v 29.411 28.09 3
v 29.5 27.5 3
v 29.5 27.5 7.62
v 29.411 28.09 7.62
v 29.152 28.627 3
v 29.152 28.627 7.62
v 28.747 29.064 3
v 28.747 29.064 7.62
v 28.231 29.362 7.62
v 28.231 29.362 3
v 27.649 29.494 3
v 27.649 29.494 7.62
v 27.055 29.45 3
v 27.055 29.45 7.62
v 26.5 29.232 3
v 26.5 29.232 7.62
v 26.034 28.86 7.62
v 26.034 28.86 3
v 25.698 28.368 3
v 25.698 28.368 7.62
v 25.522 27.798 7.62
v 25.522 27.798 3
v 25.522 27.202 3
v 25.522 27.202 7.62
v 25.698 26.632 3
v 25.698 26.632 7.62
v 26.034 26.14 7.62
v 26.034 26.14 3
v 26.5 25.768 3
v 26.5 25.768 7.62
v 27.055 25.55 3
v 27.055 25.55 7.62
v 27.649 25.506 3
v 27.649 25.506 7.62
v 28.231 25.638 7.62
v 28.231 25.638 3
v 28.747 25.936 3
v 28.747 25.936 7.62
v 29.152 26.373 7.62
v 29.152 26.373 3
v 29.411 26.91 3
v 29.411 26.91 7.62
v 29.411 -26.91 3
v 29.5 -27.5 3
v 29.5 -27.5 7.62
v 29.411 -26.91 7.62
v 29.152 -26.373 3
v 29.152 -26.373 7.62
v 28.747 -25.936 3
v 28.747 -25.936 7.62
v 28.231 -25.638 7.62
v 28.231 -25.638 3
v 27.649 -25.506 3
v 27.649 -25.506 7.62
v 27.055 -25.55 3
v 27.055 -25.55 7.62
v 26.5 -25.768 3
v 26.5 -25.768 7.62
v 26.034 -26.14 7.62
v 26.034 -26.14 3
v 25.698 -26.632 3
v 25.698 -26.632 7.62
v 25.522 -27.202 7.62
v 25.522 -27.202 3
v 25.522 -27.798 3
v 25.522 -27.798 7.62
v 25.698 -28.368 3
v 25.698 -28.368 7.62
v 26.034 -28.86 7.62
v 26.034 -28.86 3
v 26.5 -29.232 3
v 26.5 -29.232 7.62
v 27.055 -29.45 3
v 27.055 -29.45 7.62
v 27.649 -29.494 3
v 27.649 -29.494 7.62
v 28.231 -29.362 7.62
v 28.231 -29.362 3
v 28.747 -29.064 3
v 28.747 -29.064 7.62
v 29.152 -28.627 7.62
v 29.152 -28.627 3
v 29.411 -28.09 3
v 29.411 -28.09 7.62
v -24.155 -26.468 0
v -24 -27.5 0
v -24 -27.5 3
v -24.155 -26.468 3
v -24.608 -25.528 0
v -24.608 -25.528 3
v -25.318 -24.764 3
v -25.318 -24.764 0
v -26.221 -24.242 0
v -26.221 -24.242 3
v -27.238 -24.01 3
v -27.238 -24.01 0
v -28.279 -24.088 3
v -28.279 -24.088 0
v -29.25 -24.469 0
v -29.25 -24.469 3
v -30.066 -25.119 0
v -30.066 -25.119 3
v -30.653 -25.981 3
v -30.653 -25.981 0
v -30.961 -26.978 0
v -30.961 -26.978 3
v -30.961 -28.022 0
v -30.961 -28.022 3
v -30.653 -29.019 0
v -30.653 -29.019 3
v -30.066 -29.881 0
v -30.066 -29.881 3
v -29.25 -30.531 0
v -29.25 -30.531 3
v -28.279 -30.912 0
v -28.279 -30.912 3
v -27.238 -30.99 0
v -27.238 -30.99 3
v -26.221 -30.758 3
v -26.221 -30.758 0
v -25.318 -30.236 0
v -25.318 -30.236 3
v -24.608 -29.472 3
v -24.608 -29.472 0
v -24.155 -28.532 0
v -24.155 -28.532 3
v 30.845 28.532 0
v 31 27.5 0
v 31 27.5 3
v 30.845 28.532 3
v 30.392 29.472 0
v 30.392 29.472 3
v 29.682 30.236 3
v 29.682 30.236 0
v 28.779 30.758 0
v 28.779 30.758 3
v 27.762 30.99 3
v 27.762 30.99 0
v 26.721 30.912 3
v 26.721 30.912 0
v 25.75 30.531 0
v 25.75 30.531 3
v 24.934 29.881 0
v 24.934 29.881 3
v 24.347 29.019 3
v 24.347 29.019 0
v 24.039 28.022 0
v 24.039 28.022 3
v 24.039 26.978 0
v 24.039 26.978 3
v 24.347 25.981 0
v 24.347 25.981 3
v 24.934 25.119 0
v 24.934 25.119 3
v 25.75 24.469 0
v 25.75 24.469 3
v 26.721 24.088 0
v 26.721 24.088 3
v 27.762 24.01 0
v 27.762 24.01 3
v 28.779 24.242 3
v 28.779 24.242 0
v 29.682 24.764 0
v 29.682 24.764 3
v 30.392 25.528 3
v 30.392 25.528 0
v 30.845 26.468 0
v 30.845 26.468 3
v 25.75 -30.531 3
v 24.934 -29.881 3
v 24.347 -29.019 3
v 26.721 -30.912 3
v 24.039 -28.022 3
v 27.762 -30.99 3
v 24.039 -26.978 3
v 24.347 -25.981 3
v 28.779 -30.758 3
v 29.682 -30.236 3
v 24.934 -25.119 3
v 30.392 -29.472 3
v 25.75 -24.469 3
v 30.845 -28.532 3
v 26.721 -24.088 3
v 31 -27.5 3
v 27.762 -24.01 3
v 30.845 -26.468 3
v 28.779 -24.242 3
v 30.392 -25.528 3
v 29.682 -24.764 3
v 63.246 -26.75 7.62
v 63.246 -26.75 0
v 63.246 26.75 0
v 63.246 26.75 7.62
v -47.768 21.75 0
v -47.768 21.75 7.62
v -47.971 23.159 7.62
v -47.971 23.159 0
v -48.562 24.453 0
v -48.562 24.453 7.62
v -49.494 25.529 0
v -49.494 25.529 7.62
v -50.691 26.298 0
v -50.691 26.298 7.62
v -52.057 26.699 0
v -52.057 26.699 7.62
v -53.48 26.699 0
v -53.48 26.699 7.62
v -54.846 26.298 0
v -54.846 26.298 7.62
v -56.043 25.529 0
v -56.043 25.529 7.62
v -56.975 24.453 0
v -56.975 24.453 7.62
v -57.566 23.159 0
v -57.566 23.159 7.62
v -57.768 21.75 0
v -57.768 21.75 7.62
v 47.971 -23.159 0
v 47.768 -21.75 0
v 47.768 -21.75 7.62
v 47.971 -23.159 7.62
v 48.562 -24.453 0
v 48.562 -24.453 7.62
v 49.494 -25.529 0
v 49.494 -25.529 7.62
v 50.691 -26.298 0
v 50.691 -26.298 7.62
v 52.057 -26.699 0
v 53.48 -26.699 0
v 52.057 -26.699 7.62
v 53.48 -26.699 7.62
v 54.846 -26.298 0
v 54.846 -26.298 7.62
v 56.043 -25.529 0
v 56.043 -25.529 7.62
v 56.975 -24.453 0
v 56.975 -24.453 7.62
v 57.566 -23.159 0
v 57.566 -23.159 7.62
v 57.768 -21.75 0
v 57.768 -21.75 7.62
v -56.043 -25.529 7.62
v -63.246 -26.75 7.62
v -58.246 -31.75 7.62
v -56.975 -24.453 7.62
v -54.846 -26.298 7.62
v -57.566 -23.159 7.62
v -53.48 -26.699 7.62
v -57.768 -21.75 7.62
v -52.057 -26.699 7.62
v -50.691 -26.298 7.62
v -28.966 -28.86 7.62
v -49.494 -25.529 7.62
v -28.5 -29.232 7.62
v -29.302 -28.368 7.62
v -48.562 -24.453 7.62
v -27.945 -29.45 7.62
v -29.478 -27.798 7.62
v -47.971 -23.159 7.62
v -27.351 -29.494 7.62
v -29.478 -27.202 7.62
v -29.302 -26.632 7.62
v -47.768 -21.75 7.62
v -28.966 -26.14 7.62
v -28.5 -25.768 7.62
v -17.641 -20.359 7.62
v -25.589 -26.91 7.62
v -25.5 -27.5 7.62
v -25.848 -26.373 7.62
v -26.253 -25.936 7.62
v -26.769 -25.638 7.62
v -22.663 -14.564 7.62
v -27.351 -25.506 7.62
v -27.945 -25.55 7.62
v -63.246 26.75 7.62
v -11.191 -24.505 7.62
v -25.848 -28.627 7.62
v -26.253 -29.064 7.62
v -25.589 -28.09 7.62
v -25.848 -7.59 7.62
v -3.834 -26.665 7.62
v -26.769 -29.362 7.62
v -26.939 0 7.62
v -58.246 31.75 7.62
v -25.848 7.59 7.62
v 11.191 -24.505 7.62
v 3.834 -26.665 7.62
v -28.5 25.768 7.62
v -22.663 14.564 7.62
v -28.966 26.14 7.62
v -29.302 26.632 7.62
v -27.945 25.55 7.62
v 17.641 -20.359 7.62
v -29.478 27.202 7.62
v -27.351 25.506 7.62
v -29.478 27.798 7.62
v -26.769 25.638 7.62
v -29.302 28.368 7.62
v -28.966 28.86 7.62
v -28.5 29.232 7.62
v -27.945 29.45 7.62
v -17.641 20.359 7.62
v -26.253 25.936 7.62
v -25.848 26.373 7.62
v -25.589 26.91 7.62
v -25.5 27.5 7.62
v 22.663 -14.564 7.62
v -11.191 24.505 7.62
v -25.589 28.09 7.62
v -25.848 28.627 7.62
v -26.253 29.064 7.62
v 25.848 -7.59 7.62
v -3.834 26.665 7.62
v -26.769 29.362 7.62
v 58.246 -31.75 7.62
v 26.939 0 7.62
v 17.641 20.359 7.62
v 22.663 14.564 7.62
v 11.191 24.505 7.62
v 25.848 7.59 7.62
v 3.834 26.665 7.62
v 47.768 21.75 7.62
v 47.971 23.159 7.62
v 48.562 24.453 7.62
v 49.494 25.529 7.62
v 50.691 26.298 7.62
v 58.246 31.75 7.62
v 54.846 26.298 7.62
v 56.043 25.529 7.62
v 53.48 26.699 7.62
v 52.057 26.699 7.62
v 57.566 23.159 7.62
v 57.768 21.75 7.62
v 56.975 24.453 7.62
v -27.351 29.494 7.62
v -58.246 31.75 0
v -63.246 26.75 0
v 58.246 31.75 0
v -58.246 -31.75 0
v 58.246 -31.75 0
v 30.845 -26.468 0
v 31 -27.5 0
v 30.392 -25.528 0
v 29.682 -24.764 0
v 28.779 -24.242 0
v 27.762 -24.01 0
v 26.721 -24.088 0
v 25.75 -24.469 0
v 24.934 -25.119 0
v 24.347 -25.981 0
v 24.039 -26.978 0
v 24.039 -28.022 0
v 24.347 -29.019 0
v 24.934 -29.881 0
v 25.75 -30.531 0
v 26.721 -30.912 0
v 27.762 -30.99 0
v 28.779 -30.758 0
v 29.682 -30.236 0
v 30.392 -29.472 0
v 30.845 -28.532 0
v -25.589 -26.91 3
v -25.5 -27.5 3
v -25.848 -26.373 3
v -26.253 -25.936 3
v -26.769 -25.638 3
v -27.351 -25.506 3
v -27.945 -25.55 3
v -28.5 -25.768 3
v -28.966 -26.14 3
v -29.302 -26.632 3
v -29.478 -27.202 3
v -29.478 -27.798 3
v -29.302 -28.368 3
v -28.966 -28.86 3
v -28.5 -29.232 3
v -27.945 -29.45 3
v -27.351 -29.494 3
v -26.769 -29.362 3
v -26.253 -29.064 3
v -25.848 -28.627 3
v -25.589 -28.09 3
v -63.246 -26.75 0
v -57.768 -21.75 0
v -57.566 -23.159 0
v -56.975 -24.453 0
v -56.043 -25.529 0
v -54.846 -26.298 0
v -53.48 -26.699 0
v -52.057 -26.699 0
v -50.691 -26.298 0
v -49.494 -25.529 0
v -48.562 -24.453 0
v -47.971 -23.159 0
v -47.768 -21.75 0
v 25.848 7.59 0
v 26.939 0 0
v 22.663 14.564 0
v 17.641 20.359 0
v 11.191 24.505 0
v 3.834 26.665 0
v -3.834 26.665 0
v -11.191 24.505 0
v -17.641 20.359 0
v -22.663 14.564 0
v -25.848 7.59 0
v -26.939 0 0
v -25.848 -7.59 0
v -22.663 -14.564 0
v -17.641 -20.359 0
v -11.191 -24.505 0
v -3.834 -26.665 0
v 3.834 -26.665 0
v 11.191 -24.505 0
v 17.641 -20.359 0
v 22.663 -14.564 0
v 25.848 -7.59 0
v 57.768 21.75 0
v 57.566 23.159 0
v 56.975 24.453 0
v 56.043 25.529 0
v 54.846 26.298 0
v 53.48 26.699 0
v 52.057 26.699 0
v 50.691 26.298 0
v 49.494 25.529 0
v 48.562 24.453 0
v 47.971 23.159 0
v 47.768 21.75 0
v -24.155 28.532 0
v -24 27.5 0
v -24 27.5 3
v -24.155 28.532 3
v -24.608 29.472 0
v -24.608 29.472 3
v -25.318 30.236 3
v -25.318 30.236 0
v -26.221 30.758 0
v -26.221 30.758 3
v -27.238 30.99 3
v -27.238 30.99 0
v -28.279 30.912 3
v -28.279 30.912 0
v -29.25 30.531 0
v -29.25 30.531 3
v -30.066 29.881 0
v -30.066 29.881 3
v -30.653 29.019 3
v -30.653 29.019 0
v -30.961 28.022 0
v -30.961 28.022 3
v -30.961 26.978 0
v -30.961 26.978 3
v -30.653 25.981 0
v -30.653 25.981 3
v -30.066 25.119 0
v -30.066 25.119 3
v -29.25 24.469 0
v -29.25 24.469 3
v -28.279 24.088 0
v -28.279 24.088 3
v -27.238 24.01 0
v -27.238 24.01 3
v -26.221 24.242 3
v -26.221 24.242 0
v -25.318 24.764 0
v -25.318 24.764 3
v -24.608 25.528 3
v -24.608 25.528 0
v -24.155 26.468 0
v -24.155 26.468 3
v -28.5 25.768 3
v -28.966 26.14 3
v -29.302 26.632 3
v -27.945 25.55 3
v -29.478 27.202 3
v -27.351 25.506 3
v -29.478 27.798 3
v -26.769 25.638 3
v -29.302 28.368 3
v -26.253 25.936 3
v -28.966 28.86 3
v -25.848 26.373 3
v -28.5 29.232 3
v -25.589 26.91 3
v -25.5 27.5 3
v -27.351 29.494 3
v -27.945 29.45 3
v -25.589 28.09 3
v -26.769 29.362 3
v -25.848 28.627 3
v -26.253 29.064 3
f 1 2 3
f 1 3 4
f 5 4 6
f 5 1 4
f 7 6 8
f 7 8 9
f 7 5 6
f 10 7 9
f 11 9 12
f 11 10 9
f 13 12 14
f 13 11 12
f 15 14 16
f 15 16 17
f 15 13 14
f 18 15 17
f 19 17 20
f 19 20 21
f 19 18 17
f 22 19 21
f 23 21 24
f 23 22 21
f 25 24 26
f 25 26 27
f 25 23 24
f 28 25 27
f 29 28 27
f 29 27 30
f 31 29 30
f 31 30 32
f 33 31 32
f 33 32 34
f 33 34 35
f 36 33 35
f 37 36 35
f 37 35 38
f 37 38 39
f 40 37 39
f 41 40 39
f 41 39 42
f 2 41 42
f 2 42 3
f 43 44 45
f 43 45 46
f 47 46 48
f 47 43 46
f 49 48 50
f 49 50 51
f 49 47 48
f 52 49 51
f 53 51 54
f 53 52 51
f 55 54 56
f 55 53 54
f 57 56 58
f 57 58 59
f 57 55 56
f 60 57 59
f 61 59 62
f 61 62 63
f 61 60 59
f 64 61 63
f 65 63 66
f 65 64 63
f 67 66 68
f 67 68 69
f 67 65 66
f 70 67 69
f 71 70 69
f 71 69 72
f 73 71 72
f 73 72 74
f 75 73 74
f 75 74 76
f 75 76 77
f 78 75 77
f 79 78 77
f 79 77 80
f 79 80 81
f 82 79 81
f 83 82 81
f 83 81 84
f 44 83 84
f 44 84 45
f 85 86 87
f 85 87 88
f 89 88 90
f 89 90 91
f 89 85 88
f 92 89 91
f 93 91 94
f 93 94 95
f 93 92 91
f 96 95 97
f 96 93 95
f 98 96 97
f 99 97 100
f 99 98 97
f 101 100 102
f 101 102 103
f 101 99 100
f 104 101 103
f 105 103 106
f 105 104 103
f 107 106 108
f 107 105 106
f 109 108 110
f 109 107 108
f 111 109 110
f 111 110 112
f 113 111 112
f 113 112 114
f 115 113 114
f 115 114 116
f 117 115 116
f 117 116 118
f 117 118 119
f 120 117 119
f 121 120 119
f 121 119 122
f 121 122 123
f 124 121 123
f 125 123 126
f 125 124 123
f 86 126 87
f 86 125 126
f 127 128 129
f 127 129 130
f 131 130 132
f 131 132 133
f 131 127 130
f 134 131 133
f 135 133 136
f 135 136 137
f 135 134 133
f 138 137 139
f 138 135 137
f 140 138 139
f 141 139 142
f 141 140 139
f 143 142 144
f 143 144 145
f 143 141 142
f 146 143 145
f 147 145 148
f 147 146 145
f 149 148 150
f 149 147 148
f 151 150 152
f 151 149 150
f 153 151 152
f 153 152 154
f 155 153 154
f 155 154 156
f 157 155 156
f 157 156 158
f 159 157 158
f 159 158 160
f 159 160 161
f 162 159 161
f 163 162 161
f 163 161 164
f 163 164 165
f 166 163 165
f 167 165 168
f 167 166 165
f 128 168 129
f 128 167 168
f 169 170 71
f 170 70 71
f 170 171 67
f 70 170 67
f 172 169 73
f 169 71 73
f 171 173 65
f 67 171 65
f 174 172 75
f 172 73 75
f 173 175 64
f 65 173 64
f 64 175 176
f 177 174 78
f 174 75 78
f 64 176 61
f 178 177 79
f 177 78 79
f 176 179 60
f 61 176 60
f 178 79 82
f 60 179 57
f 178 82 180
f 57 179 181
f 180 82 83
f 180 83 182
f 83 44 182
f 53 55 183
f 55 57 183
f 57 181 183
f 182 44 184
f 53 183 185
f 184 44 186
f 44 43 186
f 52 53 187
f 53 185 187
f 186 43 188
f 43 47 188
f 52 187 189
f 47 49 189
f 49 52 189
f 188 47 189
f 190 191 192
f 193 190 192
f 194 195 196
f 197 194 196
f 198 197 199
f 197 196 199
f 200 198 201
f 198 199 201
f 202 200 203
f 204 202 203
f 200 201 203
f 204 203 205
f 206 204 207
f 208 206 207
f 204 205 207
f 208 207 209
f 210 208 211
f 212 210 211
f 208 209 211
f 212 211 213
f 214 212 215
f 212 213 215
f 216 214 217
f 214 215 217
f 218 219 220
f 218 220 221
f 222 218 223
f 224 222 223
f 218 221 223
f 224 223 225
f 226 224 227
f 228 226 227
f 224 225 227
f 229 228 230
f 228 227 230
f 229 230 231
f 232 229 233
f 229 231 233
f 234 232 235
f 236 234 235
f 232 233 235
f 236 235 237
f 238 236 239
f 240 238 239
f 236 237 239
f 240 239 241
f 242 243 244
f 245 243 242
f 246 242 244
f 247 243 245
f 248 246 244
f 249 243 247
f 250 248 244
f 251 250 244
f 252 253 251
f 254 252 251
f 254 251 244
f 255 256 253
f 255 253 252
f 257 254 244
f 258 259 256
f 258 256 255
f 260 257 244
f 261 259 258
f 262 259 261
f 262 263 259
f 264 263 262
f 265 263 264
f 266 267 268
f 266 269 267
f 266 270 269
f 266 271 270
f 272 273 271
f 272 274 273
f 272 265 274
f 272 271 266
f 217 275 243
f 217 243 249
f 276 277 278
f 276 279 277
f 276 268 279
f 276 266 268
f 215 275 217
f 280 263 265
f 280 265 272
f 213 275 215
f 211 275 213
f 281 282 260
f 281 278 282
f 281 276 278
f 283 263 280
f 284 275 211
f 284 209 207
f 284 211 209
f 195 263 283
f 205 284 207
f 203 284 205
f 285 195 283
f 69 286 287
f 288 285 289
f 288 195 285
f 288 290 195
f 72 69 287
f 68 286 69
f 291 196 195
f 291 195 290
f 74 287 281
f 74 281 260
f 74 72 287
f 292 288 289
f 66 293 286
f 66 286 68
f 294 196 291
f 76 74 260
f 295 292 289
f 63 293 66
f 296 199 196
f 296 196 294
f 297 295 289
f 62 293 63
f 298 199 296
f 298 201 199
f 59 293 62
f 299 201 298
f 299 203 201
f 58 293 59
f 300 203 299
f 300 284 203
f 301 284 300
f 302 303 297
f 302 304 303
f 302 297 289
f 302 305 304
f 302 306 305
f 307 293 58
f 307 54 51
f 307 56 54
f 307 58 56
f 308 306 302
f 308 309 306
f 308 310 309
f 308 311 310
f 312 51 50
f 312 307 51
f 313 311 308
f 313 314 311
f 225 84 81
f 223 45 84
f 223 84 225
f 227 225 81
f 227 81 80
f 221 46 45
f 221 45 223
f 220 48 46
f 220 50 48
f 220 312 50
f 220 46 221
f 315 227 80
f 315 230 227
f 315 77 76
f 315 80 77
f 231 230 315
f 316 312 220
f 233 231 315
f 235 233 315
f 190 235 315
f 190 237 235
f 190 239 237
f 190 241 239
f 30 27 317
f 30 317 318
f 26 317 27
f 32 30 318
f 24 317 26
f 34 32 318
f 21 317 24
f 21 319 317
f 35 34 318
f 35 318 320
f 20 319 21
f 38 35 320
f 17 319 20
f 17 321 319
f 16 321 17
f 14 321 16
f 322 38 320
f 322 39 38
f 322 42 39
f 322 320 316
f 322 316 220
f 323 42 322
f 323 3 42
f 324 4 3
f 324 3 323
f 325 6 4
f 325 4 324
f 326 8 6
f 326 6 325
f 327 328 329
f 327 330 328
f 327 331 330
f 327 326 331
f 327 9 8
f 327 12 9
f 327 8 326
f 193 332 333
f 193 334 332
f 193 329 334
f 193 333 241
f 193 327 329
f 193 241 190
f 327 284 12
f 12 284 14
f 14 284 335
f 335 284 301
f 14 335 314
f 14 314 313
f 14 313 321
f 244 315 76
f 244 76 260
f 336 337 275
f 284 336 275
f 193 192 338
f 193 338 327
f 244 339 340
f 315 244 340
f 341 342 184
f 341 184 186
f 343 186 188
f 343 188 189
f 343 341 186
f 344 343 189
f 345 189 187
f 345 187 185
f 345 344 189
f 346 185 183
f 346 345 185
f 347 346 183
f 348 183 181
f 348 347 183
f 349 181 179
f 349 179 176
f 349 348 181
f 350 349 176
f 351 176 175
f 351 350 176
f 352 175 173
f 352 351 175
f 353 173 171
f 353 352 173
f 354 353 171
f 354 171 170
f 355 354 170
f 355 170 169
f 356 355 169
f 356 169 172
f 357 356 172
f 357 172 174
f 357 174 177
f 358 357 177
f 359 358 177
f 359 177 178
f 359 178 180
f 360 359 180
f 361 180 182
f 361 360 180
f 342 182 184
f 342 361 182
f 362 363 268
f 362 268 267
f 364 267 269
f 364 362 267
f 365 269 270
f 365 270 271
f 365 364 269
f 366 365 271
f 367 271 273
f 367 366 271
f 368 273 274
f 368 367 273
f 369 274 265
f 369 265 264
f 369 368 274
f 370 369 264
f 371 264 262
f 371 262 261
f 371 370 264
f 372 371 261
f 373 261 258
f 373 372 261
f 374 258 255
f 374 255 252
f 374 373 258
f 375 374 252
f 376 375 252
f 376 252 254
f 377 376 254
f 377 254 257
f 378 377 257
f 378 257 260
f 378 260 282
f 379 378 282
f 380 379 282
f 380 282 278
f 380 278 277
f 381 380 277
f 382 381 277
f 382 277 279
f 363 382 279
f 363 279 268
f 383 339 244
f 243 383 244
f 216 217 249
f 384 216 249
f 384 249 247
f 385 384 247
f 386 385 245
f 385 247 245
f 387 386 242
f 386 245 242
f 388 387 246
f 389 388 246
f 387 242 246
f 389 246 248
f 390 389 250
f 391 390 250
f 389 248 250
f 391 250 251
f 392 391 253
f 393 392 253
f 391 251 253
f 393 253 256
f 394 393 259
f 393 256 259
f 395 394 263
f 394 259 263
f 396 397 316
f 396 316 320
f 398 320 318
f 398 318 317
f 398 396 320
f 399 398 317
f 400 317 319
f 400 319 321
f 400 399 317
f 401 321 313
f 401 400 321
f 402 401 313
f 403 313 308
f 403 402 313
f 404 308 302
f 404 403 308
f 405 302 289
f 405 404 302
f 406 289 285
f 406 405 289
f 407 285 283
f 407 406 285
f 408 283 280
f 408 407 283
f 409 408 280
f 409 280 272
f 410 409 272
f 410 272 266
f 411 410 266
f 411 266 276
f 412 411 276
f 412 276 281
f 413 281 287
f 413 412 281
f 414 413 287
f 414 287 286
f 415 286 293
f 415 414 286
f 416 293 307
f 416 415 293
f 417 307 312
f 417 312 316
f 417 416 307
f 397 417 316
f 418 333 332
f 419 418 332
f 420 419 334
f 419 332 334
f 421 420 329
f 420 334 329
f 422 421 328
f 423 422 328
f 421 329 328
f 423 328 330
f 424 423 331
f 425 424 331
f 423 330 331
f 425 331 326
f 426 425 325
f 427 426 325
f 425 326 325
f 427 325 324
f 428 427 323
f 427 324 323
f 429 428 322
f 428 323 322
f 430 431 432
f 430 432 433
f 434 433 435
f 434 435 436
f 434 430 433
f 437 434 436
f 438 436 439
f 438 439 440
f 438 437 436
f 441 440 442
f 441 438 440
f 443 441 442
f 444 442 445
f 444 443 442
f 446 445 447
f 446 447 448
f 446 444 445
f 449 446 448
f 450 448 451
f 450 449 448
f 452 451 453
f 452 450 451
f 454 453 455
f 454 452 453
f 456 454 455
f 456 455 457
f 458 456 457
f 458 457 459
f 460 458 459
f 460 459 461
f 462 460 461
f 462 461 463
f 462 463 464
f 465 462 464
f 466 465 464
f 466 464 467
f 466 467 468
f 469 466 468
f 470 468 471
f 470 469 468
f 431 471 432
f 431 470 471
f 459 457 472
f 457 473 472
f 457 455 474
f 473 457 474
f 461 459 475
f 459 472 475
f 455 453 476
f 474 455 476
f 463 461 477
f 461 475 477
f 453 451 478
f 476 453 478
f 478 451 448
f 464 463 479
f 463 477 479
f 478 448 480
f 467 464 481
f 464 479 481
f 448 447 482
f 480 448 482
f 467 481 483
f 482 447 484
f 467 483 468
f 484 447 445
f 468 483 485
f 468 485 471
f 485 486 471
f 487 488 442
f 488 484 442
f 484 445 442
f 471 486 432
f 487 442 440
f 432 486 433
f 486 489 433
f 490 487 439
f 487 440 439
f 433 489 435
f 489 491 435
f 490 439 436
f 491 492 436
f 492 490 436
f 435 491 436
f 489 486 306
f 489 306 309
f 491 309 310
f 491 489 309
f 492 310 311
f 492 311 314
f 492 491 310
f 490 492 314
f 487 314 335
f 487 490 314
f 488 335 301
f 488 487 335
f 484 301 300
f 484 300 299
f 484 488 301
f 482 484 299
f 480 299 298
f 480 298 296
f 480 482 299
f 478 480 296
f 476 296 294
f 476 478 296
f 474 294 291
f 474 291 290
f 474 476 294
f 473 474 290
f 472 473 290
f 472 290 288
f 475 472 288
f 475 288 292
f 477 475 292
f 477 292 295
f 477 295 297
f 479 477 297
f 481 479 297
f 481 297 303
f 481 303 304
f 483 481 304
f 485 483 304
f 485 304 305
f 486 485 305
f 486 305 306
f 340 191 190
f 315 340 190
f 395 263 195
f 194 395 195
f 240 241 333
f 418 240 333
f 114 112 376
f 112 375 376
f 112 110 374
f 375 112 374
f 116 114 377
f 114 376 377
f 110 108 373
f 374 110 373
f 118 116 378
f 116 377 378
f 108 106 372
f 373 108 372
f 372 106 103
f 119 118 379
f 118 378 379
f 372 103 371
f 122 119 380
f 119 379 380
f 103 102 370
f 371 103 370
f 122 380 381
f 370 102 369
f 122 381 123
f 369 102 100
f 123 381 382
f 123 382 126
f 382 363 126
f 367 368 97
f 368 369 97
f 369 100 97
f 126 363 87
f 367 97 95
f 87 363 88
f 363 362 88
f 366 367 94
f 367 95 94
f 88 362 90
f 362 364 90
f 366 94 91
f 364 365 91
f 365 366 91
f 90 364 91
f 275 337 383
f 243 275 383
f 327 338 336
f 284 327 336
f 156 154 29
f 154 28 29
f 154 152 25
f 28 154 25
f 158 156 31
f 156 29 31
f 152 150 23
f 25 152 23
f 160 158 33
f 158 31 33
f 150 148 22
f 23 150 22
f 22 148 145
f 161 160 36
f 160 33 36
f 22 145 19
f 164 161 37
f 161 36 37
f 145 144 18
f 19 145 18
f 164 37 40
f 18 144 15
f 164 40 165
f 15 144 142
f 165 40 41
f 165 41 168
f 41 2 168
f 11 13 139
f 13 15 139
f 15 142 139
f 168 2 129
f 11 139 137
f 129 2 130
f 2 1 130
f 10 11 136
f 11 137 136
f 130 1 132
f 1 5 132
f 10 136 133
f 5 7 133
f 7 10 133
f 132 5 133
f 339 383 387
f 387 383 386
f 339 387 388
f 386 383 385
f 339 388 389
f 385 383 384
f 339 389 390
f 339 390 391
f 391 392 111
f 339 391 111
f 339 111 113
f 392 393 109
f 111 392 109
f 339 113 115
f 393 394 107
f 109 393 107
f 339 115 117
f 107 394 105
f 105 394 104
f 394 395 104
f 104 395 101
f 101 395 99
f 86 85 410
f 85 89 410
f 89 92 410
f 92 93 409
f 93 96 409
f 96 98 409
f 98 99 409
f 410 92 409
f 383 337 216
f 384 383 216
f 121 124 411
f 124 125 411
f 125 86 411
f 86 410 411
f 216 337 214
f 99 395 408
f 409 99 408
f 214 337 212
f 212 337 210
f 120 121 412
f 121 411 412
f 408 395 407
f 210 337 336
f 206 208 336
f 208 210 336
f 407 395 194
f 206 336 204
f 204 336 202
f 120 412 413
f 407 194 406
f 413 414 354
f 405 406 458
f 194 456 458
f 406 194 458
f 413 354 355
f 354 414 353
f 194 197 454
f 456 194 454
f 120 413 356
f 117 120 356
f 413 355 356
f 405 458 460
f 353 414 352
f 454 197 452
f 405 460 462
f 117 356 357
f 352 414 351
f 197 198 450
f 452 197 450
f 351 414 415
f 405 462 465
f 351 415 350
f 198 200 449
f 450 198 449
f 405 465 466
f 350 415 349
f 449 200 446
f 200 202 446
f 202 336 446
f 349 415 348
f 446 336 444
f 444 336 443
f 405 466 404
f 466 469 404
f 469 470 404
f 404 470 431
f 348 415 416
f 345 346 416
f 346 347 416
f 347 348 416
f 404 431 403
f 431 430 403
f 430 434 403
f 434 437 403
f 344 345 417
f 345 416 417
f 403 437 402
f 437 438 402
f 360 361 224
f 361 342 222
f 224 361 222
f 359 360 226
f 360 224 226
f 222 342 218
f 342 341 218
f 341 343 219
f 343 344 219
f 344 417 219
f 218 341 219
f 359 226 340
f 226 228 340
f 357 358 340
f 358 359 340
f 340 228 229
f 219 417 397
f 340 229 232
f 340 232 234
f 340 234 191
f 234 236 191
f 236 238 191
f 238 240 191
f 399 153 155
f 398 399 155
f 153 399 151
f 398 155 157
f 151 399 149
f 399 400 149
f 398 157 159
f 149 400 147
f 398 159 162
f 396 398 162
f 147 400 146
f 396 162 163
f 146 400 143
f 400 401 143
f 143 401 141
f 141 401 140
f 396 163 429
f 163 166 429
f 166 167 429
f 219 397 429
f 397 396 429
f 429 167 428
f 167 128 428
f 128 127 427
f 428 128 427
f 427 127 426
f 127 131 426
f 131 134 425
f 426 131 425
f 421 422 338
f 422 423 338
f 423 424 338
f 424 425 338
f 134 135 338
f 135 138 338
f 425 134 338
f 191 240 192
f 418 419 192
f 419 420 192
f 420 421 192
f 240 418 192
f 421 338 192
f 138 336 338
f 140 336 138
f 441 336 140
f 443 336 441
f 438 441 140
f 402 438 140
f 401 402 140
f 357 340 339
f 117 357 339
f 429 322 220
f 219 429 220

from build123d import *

# Parameters (mm, degrees)
F0_R     = 3.5
F0_R_2   = 26.939
F0_R_3   = 2
F1_DEPTH = 7.62
F2_SIZE  = 5
F3_DEPTH = 3
F5_DEPTH = 7.621


with BuildPart() as f1:
    # F0 (on Top) → F1 (new body)
    with BuildSketch(Plane.XY):
        with BuildLine():
            Line((-63.246, -31.75), (53.4919352041, -31.75))
            ThreePointArc((53.4919352041, -31.75), (54.587432302, -27.425845124), (55.5221311631, -23.0641060991))
            ThreePointArc((55.5221311631, -23.0641060991), (57.1917396179, -11.5857281785), (57.75, 0))
            ThreePointArc((57.75, 0), (57.2729939153, 10.71125257), (55.8457521723, 21.3377029383))
            ThreePointArc((55.8457521723, 21.3377029383), (54.7842028331, 26.5699297025), (53.4919352041, 31.75))
            Line((53.4919352041, 31.75), (-63.246, 31.75))
            Line((-63.246, 31.75), (-63.246, 4.9753375765))
            ThreePointArc((-63.246, 4.9753375765), (-59.3944076529, 3.7067505986), (-57.75, 0))
            ThreePointArc((-57.75, 0), (-59.3944076529, -3.7067505986), (-63.246, -4.9753375765))
            Line((-63.246, -4.9753375765), (-63.246, -31.75))
        make_face()
        with Locations((-27.5, -27.5)):
            Circle(F0_R, mode=Mode.SUBTRACT)
        with Locations((27.5, -27.5)):
            Circle(F0_R, mode=Mode.SUBTRACT)
        Circle(F0_R_2, mode=Mode.SUBTRACT)
        with Locations((-27.5, 27.5)):
            Circle(F0_R, mode=Mode.SUBTRACT)
        with Locations((27.5, 27.5)):
            Circle(F0_R, mode=Mode.SUBTRACT)
        with BuildLine():
            ThreePointArc((57.75, 0), (57.1917396179, -11.5857281785), (55.5221311631, -23.0641060991))
            ThreePointArc((55.5221311631, -23.0641060991), (57.5950674928, -19.9022732128), (61.2887553012, -19.0954754674))
            ThreePointArc((61.2887553012, -19.0954754674), (62.1685752816, -12.0664638405), (62.6503984064, -4.9990078538))
            ThreePointArc((62.6503984064, -4.9990078538), (59.1794252586, -3.5001422851), (57.75, 0))
        make_face()
        with BuildLine():
            ThreePointArc((61.5539163411, 17.285438446), (57.8723808444, 18.1459903288), (55.8457521723, 21.3377029383))
            ThreePointArc((55.8457521723, 21.3377029383), (57.2729939153, 10.71125257), (57.75, 0))
            ThreePointArc((57.75, 0), (59.1794252586, 3.5001422851), (62.6503984064, 4.9990078538))
            ThreePointArc((62.6503984064, 4.9990078538), (62.2532011392, 11.1557027996), (61.5539163411, 17.285438446))
        make_face()
        with BuildLine():
            Line((-63.246, 4.9753375765), (-63.246, -4.9753375765))
            ThreePointArc((-63.246, -4.9753375765), (-59.3944076529, -3.7067505986), (-57.75, 0))
            ThreePointArc((-57.75, 0), (-59.3944076529, 3.7067505986), (-63.246, 4.9753375765))
        make_face()
        with BuildLine():
            ThreePointArc((61.5539163411, 17.285438446), (60.7667377697, 22.2230846359), (59.7835039964, 27.1254566482))
            ThreePointArc((59.7835039964, 27.1254566482), (56.6327959648, 25.0356502181), (55.8457521723, 21.3377029383))
            ThreePointArc((55.8457521723, 21.3377029383), (57.8723808444, 18.1459903288), (61.5539163411, 17.285438446))
        make_face()
        with BuildLine():
            ThreePointArc((62.6503984064, 4.9990078538), (59.1794252586, 3.5001422851), (57.75, 0))
            ThreePointArc((57.75, 0), (59.1794252586, -3.5001422851), (62.6503984064, -4.9990078538))
            ThreePointArc((62.6503984064, -4.9990078538), (62.7250971309, -2.5), (62.75, 0))
            ThreePointArc((62.75, 0), (62.7250971309, 2.5), (62.6503984064, 4.9990078538))
        make_face()
        with BuildLine():
            ThreePointArc((55.5221311631, -23.0641060991), (56.2551893582, -26.7731327404), (59.375101392, -28.9086424794))
            ThreePointArc((59.375101392, -28.9086424794), (60.4296884523, -24.0211230541), (61.2887553012, -19.0954754674))
            ThreePointArc((61.2887553012, -19.0954754674), (57.5950674928, -19.9022732128), (55.5221311631, -23.0641060991))
        make_face()
        with Locations((-27.5, -27.5)):
            Circle(F0_R)
        with Locations((-27.5, -27.5)):
            Circle(F0_R_3, mode=Mode.SUBTRACT)
        with Locations((-27.5, 27.5)):
            Circle(F0_R)
        with Locations((-27.5, 27.5)):
            Circle(F0_R_3, mode=Mode.SUBTRACT)
        with Locations((27.5, 27.5)):
            Circle(F0_R)
        with Locations((27.5, 27.5)):
            Circle(F0_R_3, mode=Mode.SUBTRACT)
        with Locations((27.5, -27.5)):
            Circle(F0_R)
        with Locations((27.5, -27.5)):
            Circle(F0_R_3, mode=Mode.SUBTRACT)
        with BuildLine():
            ThreePointArc((59.7835039964, 27.1254566482), (59.2473718355, 29.4430172575), (58.6674102013, 31.75))
            Line((58.6674102013, 31.75), (53.4919352041, 31.75))
            ThreePointArc((53.4919352041, 31.75), (54.7842028331, 26.5699297025), (55.8457521723, 21.3377029383))
            ThreePointArc((55.8457521723, 21.3377029383), (56.6327959648, 25.0356502181), (59.7835039964, 27.1254566482))
        make_face()
        with BuildLine():
            ThreePointArc((59.375101392, -28.9086424794), (61.3882555849, -28.928377791), (63.246, -28.1525137724))
            Line((63.246, -28.1525137724), (63.246, -19.8897323359))
            ThreePointArc((63.246, -19.8897323359), (62.3097981786, -19.3880692646), (61.2887553012, -19.0954754674))
            ThreePointArc((61.2887553012, -19.0954754674), (60.4296884523, -24.0211230541), (59.375101392, -28.9086424794))
        make_face()
        with BuildLine():
            ThreePointArc((63.246, 26.5651185825), (61.5654992942, 27.1588702904), (59.7835039964, 27.1254566482))
            ThreePointArc((59.7835039964, 27.1254566482), (60.7667377697, 22.2230846359), (61.5539163411, 17.285438446))
            ThreePointArc((61.5539163411, 17.285438446), (62.4268875713, 17.5067404334), (63.246, 17.8810506893))
            Line((63.246, 17.8810506893), (63.246, 26.5651185825))
        make_face()
        with BuildLine():
            Line((53.4919352041, -31.75), (58.6674102013, -31.75))
            ThreePointArc((58.6674102013, -31.75), (59.0295428897, -30.3313852893), (59.375101392, -28.9086424794))
            ThreePointArc((59.375101392, -28.9086424794), (56.2551893582, -26.7731327404), (55.5221311631, -23.0641060991))
            ThreePointArc((55.5221311631, -23.0641060991), (54.587432302, -27.425845124), (53.4919352041, -31.75))
        make_face()
        with BuildLine():
            Line((63.246, 31.75), (58.6674102013, 31.75))
            ThreePointArc((58.6674102013, 31.75), (59.2473718355, 29.4430172575), (59.7835039964, 27.1254566482))
            ThreePointArc((59.7835039964, 27.1254566482), (61.5654992942, 27.1588702904), (63.246, 26.5651185825))
            Line((63.246, 26.5651185825), (63.246, 31.75))
        make_face()
        with BuildLine():
            ThreePointArc((61.2887553012, -19.0954754674), (62.3097981786, -19.3880692646), (63.246, -19.8897323359))
            Line((63.246, -19.8897323359), (63.246, -4.9753375765))
            ThreePointArc((63.246, -4.9753375765), (62.9485522467, -4.9960561451), (62.6503984064, -4.9990078538))
            ThreePointArc((62.6503984064, -4.9990078538), (62.1685752816, -12.0664638405), (61.2887553012, -19.0954754674))
        make_face()
        with BuildLine():
            ThreePointArc((63.246, 17.8810506893), (62.4268875713, 17.5067404334), (61.5539163411, 17.285438446))
            ThreePointArc((61.5539163411, 17.285438446), (62.2532011392, 11.1557027996), (62.6503984064, 4.9990078538))
            ThreePointArc((62.6503984064, 4.9990078538), (62.9485522467, 4.9960561451), (63.246, 4.9753375765))
            Line((63.246, 4.9753375765), (63.246, 17.8810506893))
        make_face()
        with BuildLine():
            Line((58.6674102013, -31.75), (63.246, -31.75))
            Line((63.246, -31.75), (63.246, -28.1525137724))
            ThreePointArc((63.246, -28.1525137724), (61.3882555849, -28.928377791), (59.375101392, -28.9086424794))
            ThreePointArc((59.375101392, -28.9086424794), (59.0295428897, -30.3313852893), (58.6674102013, -31.75))
        make_face()
        with BuildLine():
            ThreePointArc((62.6503984064, -4.9990078538), (62.9485522467, -4.9960561451), (63.246, -4.9753375765))
            Line((63.246, -4.9753375765), (63.246, 4.9753375765))
            ThreePointArc((63.246, 4.9753375765), (62.9485522467, 4.9960561451), (62.6503984064, 4.9990078538))
            ThreePointArc((62.6503984064, 4.9990078538), (62.7250971309, 2.5), (62.75, 0))
            ThreePointArc((62.75, 0), (62.7250971309, -2.5), (62.6503984064, -4.9990078538))
        make_face()
    extrude(amount=F1_DEPTH)

    # F2
    f2_edges = [f1.edges().sort_by_distance(p)[0] for p in [
        (-63.246, 31.75, 3.81),
        (-63.246, -31.75, 3.81),
        (63.246, 31.75, 3.81),
        (63.246, -31.75, 3.81),
    ]]
    chamfer(f2_edges, length=F2_SIZE)

    # F0 (on Top) → F3 (cut)
    with BuildSketch(Plane.XY):
        with Locations((-27.5, -27.5)):
            Circle(F0_R)
        with Locations((-27.5, -27.5)):
            Circle(F0_R_3, mode=Mode.SUBTRACT)
        with Locations((27.5, -27.5)):
            Circle(F0_R)
        with Locations((27.5, -27.5)):
            Circle(F0_R_3, mode=Mode.SUBTRACT)
        with Locations((-27.5, 27.5)):
            Circle(F0_R)
        with Locations((-27.5, 27.5)):
            Circle(F0_R_3, mode=Mode.SUBTRACT)
        with Locations((27.5, 27.5)):
            Circle(F0_R)
        with Locations((27.5, 27.5)):
            Circle(F0_R_3, mode=Mode.SUBTRACT)
    extrude(amount=F3_DEPTH, mode=Mode.SUBTRACT)

    # F4 (on face) → F5 (cut, through all)
    with BuildSketch(Plane.XY.offset(7.62)):
        with BuildLine():
            Line((-47.7685, -21.75), (-47.7685, 0))
            ThreePointArc((-47.7685, 0), (-52.7685000018, -5), (-57.7685, 3.6e-09))
            Line((-57.7685, 3.6e-09), (-57.7685, -21.75))
            ThreePointArc((-57.7685, -21.75), (-52.7685, -16.75), (-47.7685, -21.75))
        make_face()
        with BuildLine():
            ThreePointArc((-57.7685, 3.6e-09), (-52.7685000018, -5), (-47.7685, 0))
            ThreePointArc((-47.7685, 0), (-52.7684999982, 5), (-57.7685, 3.6e-09))
        make_face()
        with BuildLine():
            ThreePointArc((-57.7685, 3.6e-09), (-52.7684999982, 5), (-47.7685, 0))
            Line((-47.7685, 0), (-47.7685, 21.75))
            ThreePointArc((-47.7685, 21.75), (-52.7685, 16.75), (-57.7685, 21.75))
            Line((-57.7685, 21.75), (-57.7685, 3.6e-09))
        make_face()
        with BuildLine():
            ThreePointArc((-57.7685, 21.75), (-52.7685, 16.75), (-47.7685, 21.75))
            Line((-47.7685, 21.75), (-57.7685, 21.75))
        make_face()
        with BuildLine():
            Line((-57.7685, 21.75), (-47.7685, 21.75))
            ThreePointArc((-47.7685, 21.75), (-52.7685, 26.75), (-57.7685, 21.75))
        make_face()
        with BuildLine():
            Line((-57.7685, -21.75), (-47.7685, -21.75))
            ThreePointArc((-47.7685, -21.75), (-52.7685, -16.75), (-57.7685, -21.75))
        make_face()
        with BuildLine():
            ThreePointArc((-57.7685, -21.75), (-52.7685, -26.75), (-47.7685, -21.75))
            Line((-47.7685, -21.75), (-57.7685, -21.75))
        make_face()
        with BuildLine():
            ThreePointArc((47.7685, -21.75), (52.7685, -26.75), (57.7685, -21.75))
            ThreePointArc((57.7685, -21.75), (52.7685, -16.75), (47.7685, -21.75))
        make_face()
        with BuildLine():
            Line((57.7685, -21.75), (57.7685, 21.75))
            ThreePointArc((57.7685, 21.75), (52.7685, 16.75), (47.7685, 21.75))
            Line((47.7685, 21.75), (47.7685, -21.75))
            ThreePointArc((47.7685, -21.75), (52.7685, -16.75), (57.7685, -21.75))
        make_face()
        with BuildLine():
            ThreePointArc((47.7685, 21.75), (52.7685, 16.75), (57.7685, 21.75))
            ThreePointArc((57.7685, 21.75), (52.7685, 26.75), (47.7685, 21.75))
        make_face()
    extrude(amount=-F5_DEPTH, mode=Mode.SUBTRACT)


solid = f1.part
